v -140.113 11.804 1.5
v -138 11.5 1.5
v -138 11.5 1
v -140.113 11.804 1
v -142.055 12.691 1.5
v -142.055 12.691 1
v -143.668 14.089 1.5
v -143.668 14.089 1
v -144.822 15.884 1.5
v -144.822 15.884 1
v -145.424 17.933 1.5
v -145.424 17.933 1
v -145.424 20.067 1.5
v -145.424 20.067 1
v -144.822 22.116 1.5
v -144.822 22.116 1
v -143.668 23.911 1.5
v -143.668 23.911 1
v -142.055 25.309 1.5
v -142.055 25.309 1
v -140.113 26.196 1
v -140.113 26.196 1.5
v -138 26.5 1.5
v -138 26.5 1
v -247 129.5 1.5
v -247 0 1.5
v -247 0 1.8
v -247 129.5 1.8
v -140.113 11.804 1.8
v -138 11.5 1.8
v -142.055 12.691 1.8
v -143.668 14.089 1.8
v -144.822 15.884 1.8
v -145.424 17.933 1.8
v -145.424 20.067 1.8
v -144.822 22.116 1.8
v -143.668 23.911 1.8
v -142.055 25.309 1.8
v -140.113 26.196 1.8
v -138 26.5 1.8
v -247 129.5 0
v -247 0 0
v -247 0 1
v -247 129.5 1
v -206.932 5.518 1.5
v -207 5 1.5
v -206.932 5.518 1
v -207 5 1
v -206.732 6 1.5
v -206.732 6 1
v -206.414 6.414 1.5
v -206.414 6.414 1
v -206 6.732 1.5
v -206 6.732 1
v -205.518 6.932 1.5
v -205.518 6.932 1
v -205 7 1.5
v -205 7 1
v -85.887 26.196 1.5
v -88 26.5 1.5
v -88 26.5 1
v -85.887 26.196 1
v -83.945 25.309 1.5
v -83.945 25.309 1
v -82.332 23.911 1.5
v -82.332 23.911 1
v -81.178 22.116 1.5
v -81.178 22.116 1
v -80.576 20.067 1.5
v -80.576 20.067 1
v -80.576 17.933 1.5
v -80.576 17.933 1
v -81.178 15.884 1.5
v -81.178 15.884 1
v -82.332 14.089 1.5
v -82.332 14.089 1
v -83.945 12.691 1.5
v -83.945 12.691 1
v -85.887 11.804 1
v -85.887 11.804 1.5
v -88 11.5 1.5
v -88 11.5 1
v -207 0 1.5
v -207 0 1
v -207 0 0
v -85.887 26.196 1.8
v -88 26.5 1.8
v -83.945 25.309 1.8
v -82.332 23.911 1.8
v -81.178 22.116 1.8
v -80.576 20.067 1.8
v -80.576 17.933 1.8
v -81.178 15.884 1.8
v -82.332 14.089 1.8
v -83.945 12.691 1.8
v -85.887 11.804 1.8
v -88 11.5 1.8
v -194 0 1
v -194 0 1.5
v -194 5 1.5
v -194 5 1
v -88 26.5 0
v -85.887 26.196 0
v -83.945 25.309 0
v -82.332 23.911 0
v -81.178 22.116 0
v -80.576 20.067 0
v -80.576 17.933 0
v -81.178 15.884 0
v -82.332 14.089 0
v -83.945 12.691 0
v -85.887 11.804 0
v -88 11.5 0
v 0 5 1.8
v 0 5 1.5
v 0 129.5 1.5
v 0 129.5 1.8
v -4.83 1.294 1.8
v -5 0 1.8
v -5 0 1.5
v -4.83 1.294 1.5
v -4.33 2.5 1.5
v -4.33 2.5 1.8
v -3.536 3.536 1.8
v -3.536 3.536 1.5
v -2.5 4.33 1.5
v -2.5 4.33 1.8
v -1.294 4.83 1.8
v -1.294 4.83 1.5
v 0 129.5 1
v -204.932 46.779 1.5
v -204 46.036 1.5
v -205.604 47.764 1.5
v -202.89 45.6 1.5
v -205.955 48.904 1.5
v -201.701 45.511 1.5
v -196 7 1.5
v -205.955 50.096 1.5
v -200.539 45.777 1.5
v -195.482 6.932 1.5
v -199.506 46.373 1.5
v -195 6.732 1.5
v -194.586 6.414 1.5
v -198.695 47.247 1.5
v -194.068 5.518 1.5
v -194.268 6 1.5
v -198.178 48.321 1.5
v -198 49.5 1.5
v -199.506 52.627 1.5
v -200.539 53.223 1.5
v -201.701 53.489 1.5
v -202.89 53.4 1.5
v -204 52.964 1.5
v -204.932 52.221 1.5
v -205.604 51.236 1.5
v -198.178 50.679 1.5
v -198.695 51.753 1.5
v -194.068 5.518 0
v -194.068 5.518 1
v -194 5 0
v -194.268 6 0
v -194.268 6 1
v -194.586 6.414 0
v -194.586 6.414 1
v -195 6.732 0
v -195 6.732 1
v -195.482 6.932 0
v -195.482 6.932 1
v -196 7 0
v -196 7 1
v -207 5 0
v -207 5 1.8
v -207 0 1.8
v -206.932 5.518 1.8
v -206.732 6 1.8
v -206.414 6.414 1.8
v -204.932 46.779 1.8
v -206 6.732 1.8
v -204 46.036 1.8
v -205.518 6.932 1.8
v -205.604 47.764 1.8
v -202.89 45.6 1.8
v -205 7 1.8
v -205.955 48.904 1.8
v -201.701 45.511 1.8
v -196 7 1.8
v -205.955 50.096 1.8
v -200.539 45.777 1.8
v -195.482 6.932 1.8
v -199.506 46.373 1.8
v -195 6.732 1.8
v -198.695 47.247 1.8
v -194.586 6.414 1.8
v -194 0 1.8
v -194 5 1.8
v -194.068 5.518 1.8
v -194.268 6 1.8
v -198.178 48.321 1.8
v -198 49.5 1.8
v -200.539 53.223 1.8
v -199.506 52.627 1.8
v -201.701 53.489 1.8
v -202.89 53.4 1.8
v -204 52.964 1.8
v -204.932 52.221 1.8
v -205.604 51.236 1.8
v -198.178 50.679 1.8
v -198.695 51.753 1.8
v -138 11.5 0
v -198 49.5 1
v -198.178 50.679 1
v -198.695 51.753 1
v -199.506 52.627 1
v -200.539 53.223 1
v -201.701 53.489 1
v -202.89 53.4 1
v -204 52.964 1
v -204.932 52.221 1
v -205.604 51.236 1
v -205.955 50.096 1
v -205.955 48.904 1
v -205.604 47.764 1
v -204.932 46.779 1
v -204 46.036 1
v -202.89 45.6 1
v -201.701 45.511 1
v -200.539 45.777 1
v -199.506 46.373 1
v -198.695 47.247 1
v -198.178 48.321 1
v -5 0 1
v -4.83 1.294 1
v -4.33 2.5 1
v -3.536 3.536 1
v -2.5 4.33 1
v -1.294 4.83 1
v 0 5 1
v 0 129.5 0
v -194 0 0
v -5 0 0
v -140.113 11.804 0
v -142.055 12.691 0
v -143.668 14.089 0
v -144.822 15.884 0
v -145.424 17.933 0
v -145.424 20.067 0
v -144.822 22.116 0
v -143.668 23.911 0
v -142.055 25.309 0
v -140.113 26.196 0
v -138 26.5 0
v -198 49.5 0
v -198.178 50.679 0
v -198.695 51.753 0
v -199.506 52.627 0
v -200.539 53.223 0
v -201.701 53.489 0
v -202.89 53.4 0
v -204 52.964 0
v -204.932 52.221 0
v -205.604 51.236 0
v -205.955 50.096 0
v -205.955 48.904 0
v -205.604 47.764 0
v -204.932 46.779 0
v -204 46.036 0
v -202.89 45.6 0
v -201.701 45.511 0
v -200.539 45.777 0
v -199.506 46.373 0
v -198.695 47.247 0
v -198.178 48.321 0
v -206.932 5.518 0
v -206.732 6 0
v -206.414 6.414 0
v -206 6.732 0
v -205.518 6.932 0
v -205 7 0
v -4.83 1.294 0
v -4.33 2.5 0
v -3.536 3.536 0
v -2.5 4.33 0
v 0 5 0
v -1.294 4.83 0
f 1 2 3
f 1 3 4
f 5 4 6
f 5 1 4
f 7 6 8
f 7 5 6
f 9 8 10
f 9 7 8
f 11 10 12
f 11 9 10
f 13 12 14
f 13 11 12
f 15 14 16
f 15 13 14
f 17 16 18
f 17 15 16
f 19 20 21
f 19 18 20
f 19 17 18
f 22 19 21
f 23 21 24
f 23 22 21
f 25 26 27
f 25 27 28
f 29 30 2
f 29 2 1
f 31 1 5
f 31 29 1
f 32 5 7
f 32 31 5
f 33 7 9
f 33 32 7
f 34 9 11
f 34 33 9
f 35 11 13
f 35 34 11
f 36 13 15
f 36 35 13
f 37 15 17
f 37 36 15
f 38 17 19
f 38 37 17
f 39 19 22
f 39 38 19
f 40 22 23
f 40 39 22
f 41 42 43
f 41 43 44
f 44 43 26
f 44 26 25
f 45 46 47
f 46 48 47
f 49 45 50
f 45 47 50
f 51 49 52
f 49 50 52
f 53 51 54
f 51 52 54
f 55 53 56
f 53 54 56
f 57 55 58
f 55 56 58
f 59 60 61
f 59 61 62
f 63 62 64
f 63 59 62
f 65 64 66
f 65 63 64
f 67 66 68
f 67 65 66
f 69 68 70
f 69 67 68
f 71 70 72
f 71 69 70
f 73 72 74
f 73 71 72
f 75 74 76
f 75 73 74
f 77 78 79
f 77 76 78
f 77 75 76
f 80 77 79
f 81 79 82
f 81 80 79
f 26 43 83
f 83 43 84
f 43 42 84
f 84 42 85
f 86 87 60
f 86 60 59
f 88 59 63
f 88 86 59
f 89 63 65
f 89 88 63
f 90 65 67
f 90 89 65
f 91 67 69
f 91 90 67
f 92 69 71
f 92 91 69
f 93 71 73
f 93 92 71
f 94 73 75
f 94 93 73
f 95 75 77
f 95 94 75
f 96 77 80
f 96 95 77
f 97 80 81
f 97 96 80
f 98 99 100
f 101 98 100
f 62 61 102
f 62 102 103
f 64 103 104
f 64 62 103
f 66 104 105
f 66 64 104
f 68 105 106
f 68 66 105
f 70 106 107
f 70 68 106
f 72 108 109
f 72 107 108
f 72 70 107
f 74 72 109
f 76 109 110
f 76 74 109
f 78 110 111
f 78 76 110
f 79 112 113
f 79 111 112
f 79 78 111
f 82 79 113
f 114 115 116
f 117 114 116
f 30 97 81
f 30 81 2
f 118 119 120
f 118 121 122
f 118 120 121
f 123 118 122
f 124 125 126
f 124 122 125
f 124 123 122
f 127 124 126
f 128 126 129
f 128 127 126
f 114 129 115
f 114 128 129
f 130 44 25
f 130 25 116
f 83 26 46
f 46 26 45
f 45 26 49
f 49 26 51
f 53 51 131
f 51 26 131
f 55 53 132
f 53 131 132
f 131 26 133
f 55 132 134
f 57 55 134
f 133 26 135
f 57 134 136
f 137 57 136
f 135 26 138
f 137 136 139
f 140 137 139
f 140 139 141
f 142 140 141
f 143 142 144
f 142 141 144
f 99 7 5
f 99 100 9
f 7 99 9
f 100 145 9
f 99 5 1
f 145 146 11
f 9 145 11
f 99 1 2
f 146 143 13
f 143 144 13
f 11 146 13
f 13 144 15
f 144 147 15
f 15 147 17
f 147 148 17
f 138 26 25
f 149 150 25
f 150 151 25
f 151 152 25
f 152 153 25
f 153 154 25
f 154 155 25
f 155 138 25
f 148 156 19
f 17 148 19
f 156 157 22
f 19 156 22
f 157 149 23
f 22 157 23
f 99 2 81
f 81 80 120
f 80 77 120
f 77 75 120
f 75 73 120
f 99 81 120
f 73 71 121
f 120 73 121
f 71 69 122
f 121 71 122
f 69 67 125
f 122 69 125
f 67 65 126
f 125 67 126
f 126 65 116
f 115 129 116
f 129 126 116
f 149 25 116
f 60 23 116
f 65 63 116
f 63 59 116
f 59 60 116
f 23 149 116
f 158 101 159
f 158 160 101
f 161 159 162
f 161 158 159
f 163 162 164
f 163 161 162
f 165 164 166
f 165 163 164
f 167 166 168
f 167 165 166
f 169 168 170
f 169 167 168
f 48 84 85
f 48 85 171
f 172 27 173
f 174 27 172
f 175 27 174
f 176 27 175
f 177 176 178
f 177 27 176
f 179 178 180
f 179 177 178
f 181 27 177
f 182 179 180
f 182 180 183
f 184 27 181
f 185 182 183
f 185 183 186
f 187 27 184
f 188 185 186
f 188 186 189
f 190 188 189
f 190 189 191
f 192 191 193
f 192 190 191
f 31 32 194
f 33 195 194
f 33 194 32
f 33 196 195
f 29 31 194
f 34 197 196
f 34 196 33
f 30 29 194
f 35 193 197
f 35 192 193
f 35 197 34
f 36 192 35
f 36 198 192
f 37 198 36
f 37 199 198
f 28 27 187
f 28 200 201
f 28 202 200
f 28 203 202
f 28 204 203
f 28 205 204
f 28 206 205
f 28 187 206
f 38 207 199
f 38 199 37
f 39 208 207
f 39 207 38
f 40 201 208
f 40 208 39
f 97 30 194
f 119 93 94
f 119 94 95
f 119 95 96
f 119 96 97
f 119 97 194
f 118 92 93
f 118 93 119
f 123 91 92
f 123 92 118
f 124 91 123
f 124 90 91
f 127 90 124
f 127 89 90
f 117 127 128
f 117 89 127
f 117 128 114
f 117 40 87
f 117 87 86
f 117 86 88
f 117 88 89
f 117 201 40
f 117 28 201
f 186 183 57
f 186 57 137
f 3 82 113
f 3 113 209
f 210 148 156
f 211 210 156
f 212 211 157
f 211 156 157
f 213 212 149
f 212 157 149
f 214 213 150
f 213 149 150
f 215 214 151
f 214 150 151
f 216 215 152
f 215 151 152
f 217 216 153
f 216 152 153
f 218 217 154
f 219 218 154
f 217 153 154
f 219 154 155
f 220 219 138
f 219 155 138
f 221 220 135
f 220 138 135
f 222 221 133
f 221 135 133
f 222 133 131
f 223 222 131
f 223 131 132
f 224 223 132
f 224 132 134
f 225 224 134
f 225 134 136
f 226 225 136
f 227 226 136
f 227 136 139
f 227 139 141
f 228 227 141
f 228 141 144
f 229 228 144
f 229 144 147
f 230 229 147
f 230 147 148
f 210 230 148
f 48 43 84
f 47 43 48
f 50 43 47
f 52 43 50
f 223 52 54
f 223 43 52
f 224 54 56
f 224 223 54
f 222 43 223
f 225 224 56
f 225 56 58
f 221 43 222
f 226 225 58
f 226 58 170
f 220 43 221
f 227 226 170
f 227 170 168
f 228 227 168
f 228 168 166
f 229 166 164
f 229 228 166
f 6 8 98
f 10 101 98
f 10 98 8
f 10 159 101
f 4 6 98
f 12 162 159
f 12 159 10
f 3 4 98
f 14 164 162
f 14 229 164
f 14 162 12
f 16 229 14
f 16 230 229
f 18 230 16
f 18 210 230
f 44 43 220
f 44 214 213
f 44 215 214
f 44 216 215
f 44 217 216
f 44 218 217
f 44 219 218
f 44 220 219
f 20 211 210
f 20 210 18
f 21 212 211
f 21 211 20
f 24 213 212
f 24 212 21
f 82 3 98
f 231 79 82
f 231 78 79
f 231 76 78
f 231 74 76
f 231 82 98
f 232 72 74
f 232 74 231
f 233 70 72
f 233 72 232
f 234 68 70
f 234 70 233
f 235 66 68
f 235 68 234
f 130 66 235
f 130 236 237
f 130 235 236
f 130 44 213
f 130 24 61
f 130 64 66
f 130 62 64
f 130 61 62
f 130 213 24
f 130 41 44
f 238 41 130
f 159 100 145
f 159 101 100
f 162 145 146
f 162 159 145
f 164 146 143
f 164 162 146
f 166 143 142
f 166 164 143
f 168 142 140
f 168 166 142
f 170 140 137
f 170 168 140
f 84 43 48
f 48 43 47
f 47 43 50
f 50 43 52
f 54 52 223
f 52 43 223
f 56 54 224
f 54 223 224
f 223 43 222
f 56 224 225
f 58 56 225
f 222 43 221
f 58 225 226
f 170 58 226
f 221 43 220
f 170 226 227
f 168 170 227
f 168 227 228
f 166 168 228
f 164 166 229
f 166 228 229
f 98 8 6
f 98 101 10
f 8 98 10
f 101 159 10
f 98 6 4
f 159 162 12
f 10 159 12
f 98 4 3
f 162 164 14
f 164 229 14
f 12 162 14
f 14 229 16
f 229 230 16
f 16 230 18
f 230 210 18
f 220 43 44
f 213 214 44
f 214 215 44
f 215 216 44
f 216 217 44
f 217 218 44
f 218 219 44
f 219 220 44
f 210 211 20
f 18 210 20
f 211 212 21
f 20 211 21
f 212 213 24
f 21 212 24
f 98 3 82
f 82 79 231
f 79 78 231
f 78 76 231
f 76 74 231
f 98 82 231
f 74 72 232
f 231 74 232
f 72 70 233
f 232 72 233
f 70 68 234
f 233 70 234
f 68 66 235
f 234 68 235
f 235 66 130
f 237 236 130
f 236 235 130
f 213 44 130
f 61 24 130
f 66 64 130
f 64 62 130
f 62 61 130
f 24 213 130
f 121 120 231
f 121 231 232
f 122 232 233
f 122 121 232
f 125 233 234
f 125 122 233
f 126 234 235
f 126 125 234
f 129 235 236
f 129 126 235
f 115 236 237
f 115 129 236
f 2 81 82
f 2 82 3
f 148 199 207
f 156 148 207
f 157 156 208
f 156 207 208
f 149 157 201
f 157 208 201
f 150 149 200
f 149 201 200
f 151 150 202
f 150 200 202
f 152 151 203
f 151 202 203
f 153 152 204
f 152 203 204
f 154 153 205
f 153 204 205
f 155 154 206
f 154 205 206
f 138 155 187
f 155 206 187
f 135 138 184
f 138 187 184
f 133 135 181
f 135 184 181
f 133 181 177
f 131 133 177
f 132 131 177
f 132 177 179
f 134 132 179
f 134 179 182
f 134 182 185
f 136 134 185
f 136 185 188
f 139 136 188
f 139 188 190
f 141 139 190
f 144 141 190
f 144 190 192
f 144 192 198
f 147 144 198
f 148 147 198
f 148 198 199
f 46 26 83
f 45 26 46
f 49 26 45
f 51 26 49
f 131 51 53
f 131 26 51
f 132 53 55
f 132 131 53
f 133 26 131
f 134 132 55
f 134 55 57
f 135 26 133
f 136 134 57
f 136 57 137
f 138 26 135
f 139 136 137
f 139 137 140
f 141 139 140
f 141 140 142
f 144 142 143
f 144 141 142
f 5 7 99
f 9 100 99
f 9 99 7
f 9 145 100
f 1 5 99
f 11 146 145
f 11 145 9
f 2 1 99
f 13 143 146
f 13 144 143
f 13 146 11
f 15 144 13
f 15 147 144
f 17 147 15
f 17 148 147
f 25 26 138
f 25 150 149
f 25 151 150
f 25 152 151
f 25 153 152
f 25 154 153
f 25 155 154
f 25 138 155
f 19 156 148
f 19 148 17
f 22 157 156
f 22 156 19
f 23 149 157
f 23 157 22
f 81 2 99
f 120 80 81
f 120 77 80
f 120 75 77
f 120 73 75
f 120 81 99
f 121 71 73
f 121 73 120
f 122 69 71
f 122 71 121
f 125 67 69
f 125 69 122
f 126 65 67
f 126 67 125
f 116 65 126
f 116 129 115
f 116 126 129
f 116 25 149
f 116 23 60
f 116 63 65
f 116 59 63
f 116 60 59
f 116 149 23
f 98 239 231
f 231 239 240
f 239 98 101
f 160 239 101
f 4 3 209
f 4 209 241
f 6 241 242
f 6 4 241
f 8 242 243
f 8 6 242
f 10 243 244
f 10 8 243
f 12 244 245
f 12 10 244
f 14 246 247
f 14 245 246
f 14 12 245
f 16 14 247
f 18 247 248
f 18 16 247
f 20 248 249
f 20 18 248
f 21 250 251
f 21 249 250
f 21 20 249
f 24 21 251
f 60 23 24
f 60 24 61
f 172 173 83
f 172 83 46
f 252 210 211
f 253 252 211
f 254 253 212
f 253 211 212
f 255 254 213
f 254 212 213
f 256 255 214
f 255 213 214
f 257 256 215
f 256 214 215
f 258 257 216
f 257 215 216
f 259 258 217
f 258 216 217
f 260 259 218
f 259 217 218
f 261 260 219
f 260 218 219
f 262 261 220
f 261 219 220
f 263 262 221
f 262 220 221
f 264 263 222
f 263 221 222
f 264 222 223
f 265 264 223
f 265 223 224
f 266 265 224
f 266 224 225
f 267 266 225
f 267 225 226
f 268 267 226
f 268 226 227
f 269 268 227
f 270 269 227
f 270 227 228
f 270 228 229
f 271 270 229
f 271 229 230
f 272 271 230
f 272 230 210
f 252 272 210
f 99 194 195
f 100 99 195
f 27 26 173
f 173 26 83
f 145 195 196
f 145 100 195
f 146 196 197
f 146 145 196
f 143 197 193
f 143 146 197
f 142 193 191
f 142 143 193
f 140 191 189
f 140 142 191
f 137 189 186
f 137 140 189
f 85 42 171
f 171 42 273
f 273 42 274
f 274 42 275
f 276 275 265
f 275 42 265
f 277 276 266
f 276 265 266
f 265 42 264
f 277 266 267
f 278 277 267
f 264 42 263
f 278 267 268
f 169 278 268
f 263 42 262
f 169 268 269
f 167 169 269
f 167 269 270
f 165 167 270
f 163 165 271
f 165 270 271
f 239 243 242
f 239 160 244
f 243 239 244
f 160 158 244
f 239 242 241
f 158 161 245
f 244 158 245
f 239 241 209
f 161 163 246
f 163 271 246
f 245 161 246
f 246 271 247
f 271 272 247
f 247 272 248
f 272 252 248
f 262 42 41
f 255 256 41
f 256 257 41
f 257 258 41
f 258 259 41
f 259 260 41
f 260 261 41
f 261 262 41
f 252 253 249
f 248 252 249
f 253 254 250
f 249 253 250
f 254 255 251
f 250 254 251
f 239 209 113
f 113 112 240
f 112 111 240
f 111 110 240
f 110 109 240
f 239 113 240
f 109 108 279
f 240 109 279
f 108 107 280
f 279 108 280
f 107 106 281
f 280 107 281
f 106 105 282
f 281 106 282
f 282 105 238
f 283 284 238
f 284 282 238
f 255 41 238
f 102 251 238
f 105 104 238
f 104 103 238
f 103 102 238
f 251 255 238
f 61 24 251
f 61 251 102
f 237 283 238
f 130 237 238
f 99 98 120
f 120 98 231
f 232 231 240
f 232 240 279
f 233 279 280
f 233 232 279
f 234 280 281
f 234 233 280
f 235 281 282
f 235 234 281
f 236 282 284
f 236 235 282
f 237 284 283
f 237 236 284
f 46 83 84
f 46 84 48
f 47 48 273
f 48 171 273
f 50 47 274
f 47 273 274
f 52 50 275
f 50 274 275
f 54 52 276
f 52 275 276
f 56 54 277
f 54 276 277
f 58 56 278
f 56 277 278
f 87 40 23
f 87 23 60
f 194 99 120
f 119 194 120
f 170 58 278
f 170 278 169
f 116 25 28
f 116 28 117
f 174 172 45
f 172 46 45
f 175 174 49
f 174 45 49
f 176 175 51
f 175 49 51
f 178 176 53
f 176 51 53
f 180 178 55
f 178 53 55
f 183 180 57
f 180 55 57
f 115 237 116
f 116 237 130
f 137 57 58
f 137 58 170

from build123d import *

# Parameters (mm, degrees)
SZKIC1_W                    = 247
SZKIC1_H                    = 129.5
DODANIE_WYCI_GNI_CIE1_DEPTH = 1
SZKIC2_W                    = 247
SZKIC2_H                    = 129.5
DODANIE_WYCI_GNI_CIE2_DEPTH = 0.5
SZKIC3_W                    = 247
SZKIC3_H                    = 129.5
DODANIE_WYCI_GNI_CIE3_DEPTH = 0.3
WYTNIJ_WYCI_GNI_CIE2_DEPTH  = 2.8
WYTNIJ_WYCI_GNI_CIE3_DEPTH  = 2.8
SZKIC8_W                    = 13
SZKIC8_H                    = 7
WYTNIJ_WYCI_GNI_CIE4_DEPTH  = 2.8
ZAOKR_GLENIE1_R             = 2
ZAOKR_GLENIE2_R             = 2
ZAOKR_GLENIE3_R             = 2
SZKIC9_R                    = 4
WYTNIJ_WYCI_GNI_CIE5_DEPTH  = 2.8


with BuildPart() as part:
    # Szkic1 → Dodanie-wyciągnięcie1 (new body)
    with BuildSketch(Plane.XY):
        with Locations((-123.5, 64.75)):
            Rectangle(SZKIC1_W, SZKIC1_H)
    extrude(amount=DODANIE_WYCI_GNI_CIE1_DEPTH)


with BuildPart() as body_2:
    # Szkic2 → Dodanie-wyciągnięcie2 (new body)
    with BuildSketch(Plane.XY.offset(1)):
        with Locations((-123.5, 64.75)):
            Rectangle(SZKIC2_W, SZKIC2_H)
    extrude(amount=DODANIE_WYCI_GNI_CIE2_DEPTH)


with BuildPart() as body_3:
    # Szkic3 → Dodanie-wyciągnięcie3 (new body)
    with BuildSketch(Plane.XY.offset(1.5)):
        with Locations((-123.5, 64.75)):
            Rectangle(SZKIC3_W, SZKIC3_H)
    extrude(amount=DODANIE_WYCI_GNI_CIE3_DEPTH)


with BuildPart() as wytnij_wyci_gni_cie2_tool:
    # Szkic5 → Wytnij-wyciągnięcie2 (new body, through all)
    with BuildSketch(Plane.XY.offset(1.8)):
        with BuildLine():
            Line((-138, 26.5), (-88, 26.5))
            ThreePointArc((-88, 26.5), (-80.5, 19), (-88, 11.5))
            Line((-88, 11.5), (-138, 11.5))
            ThreePointArc((-138, 11.5), (-145.5, 19), (-138, 26.5))
        make_face()
    extrude(amount=-WYTNIJ_WYCI_GNI_CIE2_DEPTH)


with BuildPart() as part_1:
    add(part.part)

    # Wytnij-wyciągnięcie2: cut by wytnij_wyci_gni_cie2_tool
    add(wytnij_wyci_gni_cie2_tool.part, mode=Mode.SUBTRACT)


with BuildPart() as body_2_1:
    add(body_2.part)

    # Wytnij-wyciągnięcie2: cut by wytnij_wyci_gni_cie2_tool
    add(wytnij_wyci_gni_cie2_tool.part, mode=Mode.SUBTRACT)


with BuildPart() as body_3_1:
    add(body_3.part)

    # Wytnij-wyciągnięcie2: cut by wytnij_wyci_gni_cie2_tool
    add(wytnij_wyci_gni_cie2_tool.part, mode=Mode.SUBTRACT)


with BuildPart() as wytnij_wyci_gni_cie3_tool:
    # Szkic6 → Wytnij-wyciągnięcie3 (new body, through all)
    with BuildSketch(Plane.XY.offset(1.8)):
        with BuildLine():
            Line((0, 0), (-5, 0))
            ThreePointArc((-5, 0), (-3.535533906, 3.535533906), (0, 5))
            Line((0, 5), (0, 0))
        make_face()
    extrude(amount=-WYTNIJ_WYCI_GNI_CIE3_DEPTH)


with BuildPart() as part_2:
    add(part_1.part)

    # Wytnij-wyciągnięcie3: cut by wytnij_wyci_gni_cie3_tool
    add(wytnij_wyci_gni_cie3_tool.part, mode=Mode.SUBTRACT)


with BuildPart() as body_2_2:
    add(body_2_1.part)

    # Wytnij-wyciągnięcie3: cut by wytnij_wyci_gni_cie3_tool
    add(wytnij_wyci_gni_cie3_tool.part, mode=Mode.SUBTRACT)


with BuildPart() as body_3_2:
    add(body_3_1.part)

    # Wytnij-wyciągnięcie3: cut by wytnij_wyci_gni_cie3_tool
    add(wytnij_wyci_gni_cie3_tool.part, mode=Mode.SUBTRACT)


with BuildPart() as wytnij_wyci_gni_cie4_tool:
    # Szkic8 → Wytnij-wyciągnięcie4 (new body, through all)
    with BuildSketch(Plane.XY.offset(1.8)):
        with Locations((-200.5, 3.5)):
            Rectangle(SZKIC8_W, SZKIC8_H)
    extrude(amount=-WYTNIJ_WYCI_GNI_CIE4_DEPTH)


with BuildPart() as part_3:
    add(part_2.part)

    # Wytnij-wyciągnięcie4: cut by wytnij_wyci_gni_cie4_tool
    add(wytnij_wyci_gni_cie4_tool.part, mode=Mode.SUBTRACT)

    # Zaokrąglenie1
    zaokr_glenie1_edges = [part_3.edges().sort_by_distance(p)[0] for p in [
        (-207, 7, 0.5),
        (-194, 7, 0.5),
    ]]
    fillet(zaokr_glenie1_edges, radius=ZAOKR_GLENIE1_R)


with BuildPart() as body_2_3:
    add(body_2_2.part)

    # Wytnij-wyciągnięcie4: cut by wytnij_wyci_gni_cie4_tool
    add(wytnij_wyci_gni_cie4_tool.part, mode=Mode.SUBTRACT)

    # Zaokrąglenie2
    zaokr_glenie2_edges = [body_2_3.edges().sort_by_distance(p)[0] for p in [
        (-207, 7, 1.25),
        (-194, 7, 1.25),
    ]]
    fillet(zaokr_glenie2_edges, radius=ZAOKR_GLENIE2_R)


with BuildPart() as body_3_3:
    add(body_3_2.part)

    # Wytnij-wyciągnięcie4: cut by wytnij_wyci_gni_cie4_tool
    add(wytnij_wyci_gni_cie4_tool.part, mode=Mode.SUBTRACT)

    # Zaokrąglenie3
    zaokr_glenie3_edges = [body_3_3.edges().sort_by_distance(p)[0] for p in [
        (-207, 7, 1.65),
        (-194, 7, 1.65),
    ]]
    fillet(zaokr_glenie3_edges, radius=ZAOKR_GLENIE3_R)


with BuildPart() as wytnij_wyci_gni_cie5_tool:
    # Szkic9 → Wytnij-wyciągnięcie5 (new body, through all)
    with BuildSketch(Plane.XY.offset(1.8)):
        with Locations((-202, 49.5)):
            Circle(SZKIC9_R)
    extrude(amount=-WYTNIJ_WYCI_GNI_CIE5_DEPTH)


with BuildPart() as part_4:
    add(part_3.part)

    # Wytnij-wyciągnięcie5: cut by wytnij_wyci_gni_cie5_tool
    add(wytnij_wyci_gni_cie5_tool.part, mode=Mode.SUBTRACT)


with BuildPart() as body_2_4:
    add(body_2_3.part)

    # Wytnij-wyciągnięcie5: cut by wytnij_wyci_gni_cie5_tool
    add(wytnij_wyci_gni_cie5_tool.part, mode=Mode.SUBTRACT)


with BuildPart() as body_3_4:
    add(body_3_3.part)

    # Wytnij-wyciągnięcie5: cut by wytnij_wyci_gni_cie5_tool
    add(wytnij_wyci_gni_cie5_tool.part, mode=Mode.SUBTRACT)


solid = Compound([part_4.part, body_2_4.part, body_3_4.part])
